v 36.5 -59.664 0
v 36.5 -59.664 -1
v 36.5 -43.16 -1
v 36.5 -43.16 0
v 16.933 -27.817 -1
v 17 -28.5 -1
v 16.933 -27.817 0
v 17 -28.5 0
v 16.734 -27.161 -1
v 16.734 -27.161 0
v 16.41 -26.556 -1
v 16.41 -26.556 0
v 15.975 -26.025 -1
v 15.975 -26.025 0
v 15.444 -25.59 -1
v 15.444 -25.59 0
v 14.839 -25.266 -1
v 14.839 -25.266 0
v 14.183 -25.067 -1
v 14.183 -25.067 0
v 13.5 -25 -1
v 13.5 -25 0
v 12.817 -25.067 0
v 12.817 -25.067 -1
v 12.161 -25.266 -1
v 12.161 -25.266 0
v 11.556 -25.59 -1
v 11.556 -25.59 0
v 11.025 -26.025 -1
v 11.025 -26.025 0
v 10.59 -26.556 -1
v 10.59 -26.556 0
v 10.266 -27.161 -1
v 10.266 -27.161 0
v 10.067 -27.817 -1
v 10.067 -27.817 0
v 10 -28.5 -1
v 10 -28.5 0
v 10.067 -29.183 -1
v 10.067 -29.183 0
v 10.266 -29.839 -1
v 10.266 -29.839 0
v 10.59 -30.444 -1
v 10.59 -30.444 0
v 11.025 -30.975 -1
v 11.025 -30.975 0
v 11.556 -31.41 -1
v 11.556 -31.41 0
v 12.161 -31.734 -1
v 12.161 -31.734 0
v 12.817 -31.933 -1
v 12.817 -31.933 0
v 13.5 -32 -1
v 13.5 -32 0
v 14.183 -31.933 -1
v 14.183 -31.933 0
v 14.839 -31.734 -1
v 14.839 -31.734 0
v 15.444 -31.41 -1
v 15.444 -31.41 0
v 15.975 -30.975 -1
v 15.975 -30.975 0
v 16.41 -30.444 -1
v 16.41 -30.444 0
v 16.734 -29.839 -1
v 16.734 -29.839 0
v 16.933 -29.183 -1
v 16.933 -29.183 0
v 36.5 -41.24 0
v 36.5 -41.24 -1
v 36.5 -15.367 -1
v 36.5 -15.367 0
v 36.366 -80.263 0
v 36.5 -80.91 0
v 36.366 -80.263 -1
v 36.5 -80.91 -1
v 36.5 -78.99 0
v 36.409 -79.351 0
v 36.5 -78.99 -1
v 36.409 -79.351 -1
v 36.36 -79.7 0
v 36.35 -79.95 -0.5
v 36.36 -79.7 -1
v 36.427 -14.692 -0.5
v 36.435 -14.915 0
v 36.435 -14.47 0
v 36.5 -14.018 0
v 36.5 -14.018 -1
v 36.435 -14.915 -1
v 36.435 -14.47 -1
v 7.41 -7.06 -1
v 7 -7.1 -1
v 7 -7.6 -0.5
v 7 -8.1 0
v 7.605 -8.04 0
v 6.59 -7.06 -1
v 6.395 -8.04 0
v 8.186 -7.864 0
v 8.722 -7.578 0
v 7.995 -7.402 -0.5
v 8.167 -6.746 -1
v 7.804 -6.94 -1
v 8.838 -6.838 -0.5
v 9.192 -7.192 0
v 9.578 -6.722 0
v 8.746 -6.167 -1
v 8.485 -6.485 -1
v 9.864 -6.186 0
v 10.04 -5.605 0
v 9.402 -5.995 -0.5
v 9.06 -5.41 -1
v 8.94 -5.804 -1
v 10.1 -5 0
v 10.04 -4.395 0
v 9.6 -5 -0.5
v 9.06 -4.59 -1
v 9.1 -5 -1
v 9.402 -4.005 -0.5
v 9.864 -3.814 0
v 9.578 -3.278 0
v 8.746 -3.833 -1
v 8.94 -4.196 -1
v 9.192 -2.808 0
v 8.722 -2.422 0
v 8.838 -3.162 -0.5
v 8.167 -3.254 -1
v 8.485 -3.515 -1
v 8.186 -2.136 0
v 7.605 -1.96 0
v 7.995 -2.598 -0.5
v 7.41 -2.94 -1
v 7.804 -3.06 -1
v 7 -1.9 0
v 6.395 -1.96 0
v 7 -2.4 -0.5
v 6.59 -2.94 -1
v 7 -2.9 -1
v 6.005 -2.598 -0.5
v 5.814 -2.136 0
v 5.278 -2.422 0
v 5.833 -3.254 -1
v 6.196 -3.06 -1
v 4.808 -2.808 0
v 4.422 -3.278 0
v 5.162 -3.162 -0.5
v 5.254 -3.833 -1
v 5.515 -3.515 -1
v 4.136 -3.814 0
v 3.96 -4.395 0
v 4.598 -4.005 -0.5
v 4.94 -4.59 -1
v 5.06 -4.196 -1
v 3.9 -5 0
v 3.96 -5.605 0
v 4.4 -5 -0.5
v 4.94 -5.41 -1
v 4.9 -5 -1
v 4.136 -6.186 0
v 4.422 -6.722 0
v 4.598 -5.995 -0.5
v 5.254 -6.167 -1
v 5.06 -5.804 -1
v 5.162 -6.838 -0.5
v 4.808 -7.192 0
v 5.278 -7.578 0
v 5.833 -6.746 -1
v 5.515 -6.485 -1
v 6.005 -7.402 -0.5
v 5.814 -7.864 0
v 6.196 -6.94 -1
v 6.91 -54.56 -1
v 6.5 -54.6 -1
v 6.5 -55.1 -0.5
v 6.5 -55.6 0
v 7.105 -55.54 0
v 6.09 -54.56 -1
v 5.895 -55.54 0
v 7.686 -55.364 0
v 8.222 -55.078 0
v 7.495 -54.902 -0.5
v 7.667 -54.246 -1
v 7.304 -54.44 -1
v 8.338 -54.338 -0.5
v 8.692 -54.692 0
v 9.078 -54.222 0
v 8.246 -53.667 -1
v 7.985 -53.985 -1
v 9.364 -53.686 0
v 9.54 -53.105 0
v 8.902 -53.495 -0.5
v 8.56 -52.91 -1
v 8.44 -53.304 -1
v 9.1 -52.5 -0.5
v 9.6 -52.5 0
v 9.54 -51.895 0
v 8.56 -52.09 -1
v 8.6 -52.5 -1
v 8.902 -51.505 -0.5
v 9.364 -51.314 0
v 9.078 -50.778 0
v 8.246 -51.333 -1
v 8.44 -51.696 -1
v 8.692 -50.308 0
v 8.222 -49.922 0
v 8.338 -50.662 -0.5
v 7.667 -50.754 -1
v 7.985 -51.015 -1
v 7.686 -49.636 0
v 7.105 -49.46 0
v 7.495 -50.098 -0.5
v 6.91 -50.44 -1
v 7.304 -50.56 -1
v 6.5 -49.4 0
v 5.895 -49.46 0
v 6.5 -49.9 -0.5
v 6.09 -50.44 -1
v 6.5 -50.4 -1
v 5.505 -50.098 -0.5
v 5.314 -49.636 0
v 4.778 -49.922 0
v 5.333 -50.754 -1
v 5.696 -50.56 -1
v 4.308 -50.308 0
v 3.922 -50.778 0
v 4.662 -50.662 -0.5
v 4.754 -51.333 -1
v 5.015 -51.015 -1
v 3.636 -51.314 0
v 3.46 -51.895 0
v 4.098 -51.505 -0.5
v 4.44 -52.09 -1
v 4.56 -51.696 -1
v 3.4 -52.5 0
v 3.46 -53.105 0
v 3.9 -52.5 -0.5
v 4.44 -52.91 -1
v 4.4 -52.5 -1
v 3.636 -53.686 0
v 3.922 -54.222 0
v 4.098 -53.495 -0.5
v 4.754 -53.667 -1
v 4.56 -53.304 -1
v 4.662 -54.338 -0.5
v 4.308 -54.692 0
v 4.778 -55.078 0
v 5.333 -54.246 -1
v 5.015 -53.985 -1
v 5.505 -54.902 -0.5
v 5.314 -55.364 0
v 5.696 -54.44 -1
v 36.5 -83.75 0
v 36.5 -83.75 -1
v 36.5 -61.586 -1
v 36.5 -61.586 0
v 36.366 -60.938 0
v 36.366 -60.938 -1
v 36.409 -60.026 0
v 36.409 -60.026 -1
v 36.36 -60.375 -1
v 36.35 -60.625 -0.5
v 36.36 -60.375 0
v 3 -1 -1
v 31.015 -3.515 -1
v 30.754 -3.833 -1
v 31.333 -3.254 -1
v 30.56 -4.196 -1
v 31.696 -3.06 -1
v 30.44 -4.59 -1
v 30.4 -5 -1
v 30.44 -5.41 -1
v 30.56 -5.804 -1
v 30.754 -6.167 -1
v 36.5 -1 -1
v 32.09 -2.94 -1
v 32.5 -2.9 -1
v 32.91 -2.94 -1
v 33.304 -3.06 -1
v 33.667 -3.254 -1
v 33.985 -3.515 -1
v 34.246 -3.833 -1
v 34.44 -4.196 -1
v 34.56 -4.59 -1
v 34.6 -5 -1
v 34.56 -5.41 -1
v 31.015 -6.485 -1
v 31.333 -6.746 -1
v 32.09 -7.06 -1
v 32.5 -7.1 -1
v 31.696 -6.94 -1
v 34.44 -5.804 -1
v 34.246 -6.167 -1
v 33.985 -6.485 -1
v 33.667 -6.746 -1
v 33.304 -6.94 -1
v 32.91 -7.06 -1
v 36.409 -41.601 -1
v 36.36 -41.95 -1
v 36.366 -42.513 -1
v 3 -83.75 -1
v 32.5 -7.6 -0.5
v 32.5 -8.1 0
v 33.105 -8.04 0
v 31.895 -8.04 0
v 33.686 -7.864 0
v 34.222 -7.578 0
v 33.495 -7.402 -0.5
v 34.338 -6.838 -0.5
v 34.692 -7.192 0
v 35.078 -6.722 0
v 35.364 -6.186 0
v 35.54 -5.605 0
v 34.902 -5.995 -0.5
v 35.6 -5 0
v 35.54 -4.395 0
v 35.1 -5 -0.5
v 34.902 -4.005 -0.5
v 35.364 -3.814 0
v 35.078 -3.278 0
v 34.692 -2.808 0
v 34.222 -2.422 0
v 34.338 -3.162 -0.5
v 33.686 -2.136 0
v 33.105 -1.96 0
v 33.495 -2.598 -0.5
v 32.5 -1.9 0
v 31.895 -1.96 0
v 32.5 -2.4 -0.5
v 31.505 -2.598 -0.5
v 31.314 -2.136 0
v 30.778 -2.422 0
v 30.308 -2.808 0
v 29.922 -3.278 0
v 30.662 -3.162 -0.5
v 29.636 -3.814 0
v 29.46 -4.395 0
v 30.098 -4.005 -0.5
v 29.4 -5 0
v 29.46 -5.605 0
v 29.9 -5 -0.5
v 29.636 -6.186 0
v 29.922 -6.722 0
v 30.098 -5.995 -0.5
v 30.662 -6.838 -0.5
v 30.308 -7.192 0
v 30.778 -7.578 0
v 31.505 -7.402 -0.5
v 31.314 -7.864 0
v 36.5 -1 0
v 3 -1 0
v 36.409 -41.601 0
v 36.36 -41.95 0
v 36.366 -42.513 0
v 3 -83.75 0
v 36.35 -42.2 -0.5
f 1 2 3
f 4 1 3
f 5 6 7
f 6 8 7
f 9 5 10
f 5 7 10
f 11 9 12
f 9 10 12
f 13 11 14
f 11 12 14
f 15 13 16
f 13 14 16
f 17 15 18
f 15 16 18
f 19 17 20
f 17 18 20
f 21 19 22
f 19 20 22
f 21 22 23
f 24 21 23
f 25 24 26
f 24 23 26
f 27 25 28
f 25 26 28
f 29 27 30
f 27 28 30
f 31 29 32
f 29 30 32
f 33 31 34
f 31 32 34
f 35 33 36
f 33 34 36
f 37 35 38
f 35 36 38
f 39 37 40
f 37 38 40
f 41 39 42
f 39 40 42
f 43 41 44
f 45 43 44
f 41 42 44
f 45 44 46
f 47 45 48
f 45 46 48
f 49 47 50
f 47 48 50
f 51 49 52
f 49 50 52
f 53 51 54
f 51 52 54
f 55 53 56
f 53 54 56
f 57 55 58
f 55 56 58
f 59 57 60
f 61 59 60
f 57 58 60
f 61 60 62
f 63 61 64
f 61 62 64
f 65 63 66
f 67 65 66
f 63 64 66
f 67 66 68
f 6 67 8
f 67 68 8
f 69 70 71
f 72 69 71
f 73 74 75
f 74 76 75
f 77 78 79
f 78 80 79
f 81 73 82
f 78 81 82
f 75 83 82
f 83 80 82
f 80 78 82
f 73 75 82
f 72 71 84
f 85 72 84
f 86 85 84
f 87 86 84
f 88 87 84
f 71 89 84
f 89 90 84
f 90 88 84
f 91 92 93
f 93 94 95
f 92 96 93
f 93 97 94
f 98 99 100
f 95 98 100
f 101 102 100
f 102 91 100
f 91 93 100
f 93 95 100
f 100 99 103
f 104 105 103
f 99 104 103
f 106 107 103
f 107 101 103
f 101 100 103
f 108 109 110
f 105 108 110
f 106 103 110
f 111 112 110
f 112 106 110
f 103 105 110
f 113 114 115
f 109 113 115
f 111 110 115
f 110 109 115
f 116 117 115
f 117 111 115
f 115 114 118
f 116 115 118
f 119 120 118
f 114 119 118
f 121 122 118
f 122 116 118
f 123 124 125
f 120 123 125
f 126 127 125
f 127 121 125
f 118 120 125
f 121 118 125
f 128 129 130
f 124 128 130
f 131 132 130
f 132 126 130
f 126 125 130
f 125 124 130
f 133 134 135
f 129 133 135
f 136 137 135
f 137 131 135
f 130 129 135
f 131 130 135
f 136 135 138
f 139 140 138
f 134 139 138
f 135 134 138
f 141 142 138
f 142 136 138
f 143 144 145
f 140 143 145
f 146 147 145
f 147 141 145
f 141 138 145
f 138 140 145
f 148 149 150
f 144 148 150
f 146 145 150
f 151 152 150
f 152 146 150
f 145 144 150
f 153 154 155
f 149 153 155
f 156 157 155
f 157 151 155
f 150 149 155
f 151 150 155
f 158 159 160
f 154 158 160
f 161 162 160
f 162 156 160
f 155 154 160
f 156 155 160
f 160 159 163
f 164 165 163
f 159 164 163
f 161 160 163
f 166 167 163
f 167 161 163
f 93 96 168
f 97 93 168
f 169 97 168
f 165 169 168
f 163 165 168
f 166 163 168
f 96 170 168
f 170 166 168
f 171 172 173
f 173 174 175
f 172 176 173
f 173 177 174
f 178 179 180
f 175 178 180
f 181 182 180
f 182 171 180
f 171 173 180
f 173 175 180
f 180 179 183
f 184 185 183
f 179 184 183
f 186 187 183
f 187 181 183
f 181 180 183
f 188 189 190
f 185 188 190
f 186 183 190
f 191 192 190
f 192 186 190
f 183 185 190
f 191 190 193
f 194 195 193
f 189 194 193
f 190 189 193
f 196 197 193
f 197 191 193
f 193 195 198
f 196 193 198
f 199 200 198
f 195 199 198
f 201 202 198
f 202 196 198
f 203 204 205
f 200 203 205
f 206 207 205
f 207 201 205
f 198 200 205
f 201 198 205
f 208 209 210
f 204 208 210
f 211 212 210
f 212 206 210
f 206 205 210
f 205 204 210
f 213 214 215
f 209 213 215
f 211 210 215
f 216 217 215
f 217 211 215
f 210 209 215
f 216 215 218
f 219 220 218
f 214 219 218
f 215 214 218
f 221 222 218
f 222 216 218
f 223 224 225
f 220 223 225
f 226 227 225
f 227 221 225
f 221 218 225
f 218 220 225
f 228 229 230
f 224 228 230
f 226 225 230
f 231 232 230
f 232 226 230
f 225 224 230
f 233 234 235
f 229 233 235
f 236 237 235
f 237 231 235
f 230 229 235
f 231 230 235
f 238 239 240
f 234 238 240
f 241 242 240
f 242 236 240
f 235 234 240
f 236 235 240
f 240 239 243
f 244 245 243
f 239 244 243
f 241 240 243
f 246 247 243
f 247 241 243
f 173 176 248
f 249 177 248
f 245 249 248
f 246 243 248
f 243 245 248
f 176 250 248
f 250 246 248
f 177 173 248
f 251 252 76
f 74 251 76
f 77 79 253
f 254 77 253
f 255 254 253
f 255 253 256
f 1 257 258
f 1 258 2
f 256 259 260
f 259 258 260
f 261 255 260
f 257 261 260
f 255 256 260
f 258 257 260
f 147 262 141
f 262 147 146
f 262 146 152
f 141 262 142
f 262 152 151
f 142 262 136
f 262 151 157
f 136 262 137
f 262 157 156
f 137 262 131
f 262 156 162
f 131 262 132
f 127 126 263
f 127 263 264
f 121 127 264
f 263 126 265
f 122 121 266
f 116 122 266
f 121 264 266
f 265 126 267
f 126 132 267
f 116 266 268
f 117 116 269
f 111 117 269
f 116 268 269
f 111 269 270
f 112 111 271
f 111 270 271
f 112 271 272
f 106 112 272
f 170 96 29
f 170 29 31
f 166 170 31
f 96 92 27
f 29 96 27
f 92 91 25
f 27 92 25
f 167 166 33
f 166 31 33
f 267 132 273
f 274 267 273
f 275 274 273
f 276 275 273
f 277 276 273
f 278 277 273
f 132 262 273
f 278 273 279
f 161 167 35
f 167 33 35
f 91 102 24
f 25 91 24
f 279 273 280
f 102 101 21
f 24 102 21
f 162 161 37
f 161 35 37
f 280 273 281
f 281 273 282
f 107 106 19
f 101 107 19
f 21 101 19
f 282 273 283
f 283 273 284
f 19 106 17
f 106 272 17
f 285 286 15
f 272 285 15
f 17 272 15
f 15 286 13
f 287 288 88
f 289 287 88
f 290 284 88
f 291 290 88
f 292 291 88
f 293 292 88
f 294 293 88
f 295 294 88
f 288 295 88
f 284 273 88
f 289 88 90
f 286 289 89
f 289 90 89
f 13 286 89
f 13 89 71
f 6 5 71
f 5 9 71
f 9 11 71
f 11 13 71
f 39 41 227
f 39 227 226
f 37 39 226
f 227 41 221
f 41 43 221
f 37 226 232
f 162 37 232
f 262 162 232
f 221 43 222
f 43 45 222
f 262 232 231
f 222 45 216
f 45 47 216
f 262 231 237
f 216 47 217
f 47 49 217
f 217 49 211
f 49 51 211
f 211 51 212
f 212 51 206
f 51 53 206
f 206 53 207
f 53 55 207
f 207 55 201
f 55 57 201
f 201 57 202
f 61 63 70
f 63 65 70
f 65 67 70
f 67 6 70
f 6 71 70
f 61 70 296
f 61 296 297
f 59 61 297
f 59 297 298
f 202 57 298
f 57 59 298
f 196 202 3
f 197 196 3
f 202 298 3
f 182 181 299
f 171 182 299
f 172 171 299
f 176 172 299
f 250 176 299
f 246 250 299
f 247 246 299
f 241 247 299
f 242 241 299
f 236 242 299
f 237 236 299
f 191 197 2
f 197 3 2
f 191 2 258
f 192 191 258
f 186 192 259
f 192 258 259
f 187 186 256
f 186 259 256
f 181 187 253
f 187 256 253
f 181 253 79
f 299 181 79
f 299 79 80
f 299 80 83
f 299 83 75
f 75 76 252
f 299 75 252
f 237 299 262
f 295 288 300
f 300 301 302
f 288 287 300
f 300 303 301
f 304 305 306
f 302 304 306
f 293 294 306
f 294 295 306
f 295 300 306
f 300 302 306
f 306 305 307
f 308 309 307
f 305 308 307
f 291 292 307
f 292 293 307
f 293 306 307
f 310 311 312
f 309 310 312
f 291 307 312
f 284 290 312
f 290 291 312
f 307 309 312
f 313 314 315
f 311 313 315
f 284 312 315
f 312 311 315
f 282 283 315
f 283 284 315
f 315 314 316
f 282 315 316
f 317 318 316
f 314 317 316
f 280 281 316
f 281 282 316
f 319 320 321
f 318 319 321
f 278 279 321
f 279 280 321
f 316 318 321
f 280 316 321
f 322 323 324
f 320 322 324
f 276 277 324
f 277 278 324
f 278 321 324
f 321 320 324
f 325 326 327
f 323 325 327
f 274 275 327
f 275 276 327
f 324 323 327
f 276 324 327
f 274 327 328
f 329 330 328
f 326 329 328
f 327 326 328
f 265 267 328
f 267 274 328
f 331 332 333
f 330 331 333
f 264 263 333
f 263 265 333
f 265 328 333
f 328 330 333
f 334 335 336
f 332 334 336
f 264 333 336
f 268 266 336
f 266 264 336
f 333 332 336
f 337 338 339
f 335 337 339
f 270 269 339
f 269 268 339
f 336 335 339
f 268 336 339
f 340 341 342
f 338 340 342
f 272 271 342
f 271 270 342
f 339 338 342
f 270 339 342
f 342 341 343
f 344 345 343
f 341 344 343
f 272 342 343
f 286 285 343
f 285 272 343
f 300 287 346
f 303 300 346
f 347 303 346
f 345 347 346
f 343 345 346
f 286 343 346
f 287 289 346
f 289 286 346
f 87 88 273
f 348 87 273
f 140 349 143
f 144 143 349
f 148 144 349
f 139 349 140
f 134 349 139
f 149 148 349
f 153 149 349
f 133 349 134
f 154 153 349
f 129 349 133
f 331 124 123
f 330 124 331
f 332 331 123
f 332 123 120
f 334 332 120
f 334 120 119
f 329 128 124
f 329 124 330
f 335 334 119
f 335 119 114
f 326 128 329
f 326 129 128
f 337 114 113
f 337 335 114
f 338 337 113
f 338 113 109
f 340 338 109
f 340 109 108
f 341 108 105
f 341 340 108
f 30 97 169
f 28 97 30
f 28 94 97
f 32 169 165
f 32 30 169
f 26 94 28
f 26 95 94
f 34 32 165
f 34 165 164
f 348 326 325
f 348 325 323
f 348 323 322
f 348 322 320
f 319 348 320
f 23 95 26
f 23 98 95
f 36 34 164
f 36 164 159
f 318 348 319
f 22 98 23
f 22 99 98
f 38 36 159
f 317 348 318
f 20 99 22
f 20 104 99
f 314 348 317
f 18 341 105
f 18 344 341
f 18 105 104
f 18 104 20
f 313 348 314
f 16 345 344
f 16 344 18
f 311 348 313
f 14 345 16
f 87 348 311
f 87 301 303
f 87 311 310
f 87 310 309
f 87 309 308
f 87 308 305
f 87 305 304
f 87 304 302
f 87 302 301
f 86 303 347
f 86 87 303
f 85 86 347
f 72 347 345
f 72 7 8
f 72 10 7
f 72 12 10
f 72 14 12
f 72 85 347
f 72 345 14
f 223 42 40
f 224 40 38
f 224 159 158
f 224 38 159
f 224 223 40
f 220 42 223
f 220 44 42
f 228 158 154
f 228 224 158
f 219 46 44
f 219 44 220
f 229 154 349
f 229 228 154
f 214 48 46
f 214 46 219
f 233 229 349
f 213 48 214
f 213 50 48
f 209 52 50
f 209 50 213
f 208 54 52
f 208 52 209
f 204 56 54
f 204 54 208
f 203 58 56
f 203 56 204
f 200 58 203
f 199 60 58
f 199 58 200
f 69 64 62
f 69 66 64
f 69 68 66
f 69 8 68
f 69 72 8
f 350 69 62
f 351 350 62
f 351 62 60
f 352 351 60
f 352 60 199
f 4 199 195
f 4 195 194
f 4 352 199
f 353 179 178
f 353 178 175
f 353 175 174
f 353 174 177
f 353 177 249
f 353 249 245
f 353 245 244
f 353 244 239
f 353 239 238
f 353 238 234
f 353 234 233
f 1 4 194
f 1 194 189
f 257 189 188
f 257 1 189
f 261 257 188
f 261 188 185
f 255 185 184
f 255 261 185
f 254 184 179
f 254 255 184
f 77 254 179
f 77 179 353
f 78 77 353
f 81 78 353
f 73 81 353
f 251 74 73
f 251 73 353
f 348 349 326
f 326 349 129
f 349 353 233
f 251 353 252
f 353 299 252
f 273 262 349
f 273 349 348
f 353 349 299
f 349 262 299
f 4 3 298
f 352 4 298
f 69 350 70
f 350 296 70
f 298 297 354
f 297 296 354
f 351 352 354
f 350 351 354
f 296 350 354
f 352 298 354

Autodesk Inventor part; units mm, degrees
ref_plane "YZ Plane" through (0, 0, 0) normal (1, 0, 0) x (0, 1, 0)
ref_plane "XZ Plane" through (0, 0, 0) normal (0, 1, 0) x (-1, 0, 0)
ref_plane "XY Plane" through (0, 0, 0) normal (0, 0, 1) x (1, 0, 0)
ref_plane "Work Plane1" through (3, 4, -1) normal (0, 0, 1) x (0, -1, 0)
sketch "Sketch1" plane through (3, 4, -1) normal (0, 0, 1) x (0, -1, 0)
  line L0 (87.75, 33.5) -> (84.9105, 33.5) projected
  line L1 (5, 0) -> (5, 33.5) projected
  line L2 (5, 0) -> (87.75, 0) projected
  line L3 (5, 0) -> (60, 0) projected
  line L4 (5, -3) -> (5, 0) projected
  line L5 (4, -3) -> (60, -3) projected
  line L6 (60, -3) -> (60, 0) projected
  line L7 (60, 0) -> (61.551, 0) projected
  circle A0 centre (74.375, 17.375) radius 6.75 projected
  line L8 (60, 0) -> (60, 33.5)
  circle A1 centre (32.5, 10.5) radius 5.5 projected
  circle A2 centre (9, 4) radius 2.1 projected
  circle A3 centre (9, 29.5) radius 2.1 projected
  circle A4 centre (56.5, 3.5) radius 2.1 projected
  line L9 (82.9895, 33.5) -> (65.5855, 33.5) projected
  line L10 (63.6645, 33.5) -> (47.1605, 33.5) projected
  spline S0 degree 2 poles (47.1605, 33.5) (46.2, 33.2071) (45.2395, 33.5) knots 0 0 0 0.194422 0.194422 0.194422 weights 1 1.05 1 projected
  line L11 (45.2395, 33.5) -> (19.3669, 33.5) projected
  spline S1 degree 2 poles (19.3669, 33.5) (18.6923, 33.3555) (18.0177, 33.5) knots 0 0 0 0.135703 0.135703 0.135703 weights 1 1.02375 1 projected
  spline S2 degree 2 poles (84.9105, 33.5) (83.95, 33.2071) (82.9895, 33.5) knots 0 0 0 0.194422 0.194422 0.194422 weights 1 1.05 1 projected
  spline S3 degree 2 poles (65.5855, 33.5) (64.625, 33.2071) (63.6645, 33.5) knots 0 0 0 0.194422 0.194422 0.194422 weights 1 1.05 1 projected
  line L12 (87.75, 0) -> (87.75, 33.5) projected
  line L13 (18.0177, 33.5) -> (5, 33.5) projected
  arc A5 (60, 1.551) -> (61.551, 0) centre (62.75, 2.75) ccw projected
  line L14 (60, 1.551) -> (60, 0) projected
  point P0 (89.75, 33.5)
  point P1 (52, 0)
  point P2 (64.076, 0)
  point P3 (87.674, 0)
  point P4 (63.25, 3.25)
  point P5 (86.9105, 33.5)
  point P6 (84.9895, 33.5)
  point P7 (63.949, 0)
  point P8 (84.801, 0)
extrude "Extrusion1" add sketch "Sketch1" along normal blind 1 contours L12 L2 A5 L8 L10 S3 L9 S2 L0 | L2 L8 A5 | L2 L1 L13 S1 L11 S0 L10 L8 | A0 | A1 | A2 | A3 | A4
sketch "Sketch2" plane through (3, 4, 0) normal (0, 0, 1) x (1, 0, 0)
  line L0 (12.5287, -34.71) -> (8.4496, -34.6899)
  arc A0 (8.4713, -30.29) -> (8.4496, -34.6899) centre (10.5, -32.5) ccw
  line L1 (8.4713, -30.29) -> (12.5504, -30.3101)
  arc A1 (12.5287, -34.71) -> (12.5504, -30.3101) centre (10.5, -32.5) ccw
  circle A2 centre (10.5, -32.5) radius 3
  circle A3 centre (10.5, -32.5) radius 3.5
  point P0 (-3, -4)
  dimension "d5" = 0.5
extrude "Extrusion2" cut sketch "Sketch2" against normal up to next contours A2 L0 | L0 A0 L1 A1 | A2 L1 | A3
sketch "Sketch3" plane through (3, 4, 0) normal (0, 0, 1) x (1, 0, 0)
  circle A0 centre (10.5, -32.5) radius 3.5 projected
  line L0 (0, -5) -> (0, -87.75) projected
  line L1 (33.5, -5) -> (0, -5) projected
  circle A1 centre (3.5, -56.5) radius 3.5
  circle A2 centre (4, -9) radius 4
  circle A3 centre (3.5, -56.5) radius 2.6
  circle A4 centre (4, -9) radius 2.6
  circle A5 centre (29.5, -9) radius 4
  circle A6 centre (29.5, -9) radius 2.6
  line L2 (33.5, -63.6645) -> (33.5, -47.1605) projected
  line L3 (33.5, -45.2395) -> (33.5, -19.3669) projected
  line L4 (33.5, -18.0177) -> (33.5, -5) projected
  line L5 (0, -87.75) -> (33.5, -87.75) projected
  line L6 (33.5, -87.75) -> (33.5, -84.9105) projected
  line L7 (33.5, -82.9895) -> (33.5, -65.5855) projected
  point P0 (-3, -4)
  dimension "d8" = 7
  dimension "d17" = 8
  dimension "d18" = 5.2
  dimension "d19" = 5.2
  dimension "d20" = 4
  dimension "d21" = 4
  dimension "d22" = 8
  dimension "d23" = 5.2
  dimension "d25" = 4
hole "Hole1" at (6.5, -52.5, 0) at (7, -5, 0) at (32.5, -5, 0) direction (0, 0, -1) diameter 3.6 end through all countersink diameter 6.2 countersink angle 90 clearance for "Countersunk Flat Head Screw ISO 2009/7046" size "M3" standard "ISO"
properties part number "right_metal_gear_bracker"
